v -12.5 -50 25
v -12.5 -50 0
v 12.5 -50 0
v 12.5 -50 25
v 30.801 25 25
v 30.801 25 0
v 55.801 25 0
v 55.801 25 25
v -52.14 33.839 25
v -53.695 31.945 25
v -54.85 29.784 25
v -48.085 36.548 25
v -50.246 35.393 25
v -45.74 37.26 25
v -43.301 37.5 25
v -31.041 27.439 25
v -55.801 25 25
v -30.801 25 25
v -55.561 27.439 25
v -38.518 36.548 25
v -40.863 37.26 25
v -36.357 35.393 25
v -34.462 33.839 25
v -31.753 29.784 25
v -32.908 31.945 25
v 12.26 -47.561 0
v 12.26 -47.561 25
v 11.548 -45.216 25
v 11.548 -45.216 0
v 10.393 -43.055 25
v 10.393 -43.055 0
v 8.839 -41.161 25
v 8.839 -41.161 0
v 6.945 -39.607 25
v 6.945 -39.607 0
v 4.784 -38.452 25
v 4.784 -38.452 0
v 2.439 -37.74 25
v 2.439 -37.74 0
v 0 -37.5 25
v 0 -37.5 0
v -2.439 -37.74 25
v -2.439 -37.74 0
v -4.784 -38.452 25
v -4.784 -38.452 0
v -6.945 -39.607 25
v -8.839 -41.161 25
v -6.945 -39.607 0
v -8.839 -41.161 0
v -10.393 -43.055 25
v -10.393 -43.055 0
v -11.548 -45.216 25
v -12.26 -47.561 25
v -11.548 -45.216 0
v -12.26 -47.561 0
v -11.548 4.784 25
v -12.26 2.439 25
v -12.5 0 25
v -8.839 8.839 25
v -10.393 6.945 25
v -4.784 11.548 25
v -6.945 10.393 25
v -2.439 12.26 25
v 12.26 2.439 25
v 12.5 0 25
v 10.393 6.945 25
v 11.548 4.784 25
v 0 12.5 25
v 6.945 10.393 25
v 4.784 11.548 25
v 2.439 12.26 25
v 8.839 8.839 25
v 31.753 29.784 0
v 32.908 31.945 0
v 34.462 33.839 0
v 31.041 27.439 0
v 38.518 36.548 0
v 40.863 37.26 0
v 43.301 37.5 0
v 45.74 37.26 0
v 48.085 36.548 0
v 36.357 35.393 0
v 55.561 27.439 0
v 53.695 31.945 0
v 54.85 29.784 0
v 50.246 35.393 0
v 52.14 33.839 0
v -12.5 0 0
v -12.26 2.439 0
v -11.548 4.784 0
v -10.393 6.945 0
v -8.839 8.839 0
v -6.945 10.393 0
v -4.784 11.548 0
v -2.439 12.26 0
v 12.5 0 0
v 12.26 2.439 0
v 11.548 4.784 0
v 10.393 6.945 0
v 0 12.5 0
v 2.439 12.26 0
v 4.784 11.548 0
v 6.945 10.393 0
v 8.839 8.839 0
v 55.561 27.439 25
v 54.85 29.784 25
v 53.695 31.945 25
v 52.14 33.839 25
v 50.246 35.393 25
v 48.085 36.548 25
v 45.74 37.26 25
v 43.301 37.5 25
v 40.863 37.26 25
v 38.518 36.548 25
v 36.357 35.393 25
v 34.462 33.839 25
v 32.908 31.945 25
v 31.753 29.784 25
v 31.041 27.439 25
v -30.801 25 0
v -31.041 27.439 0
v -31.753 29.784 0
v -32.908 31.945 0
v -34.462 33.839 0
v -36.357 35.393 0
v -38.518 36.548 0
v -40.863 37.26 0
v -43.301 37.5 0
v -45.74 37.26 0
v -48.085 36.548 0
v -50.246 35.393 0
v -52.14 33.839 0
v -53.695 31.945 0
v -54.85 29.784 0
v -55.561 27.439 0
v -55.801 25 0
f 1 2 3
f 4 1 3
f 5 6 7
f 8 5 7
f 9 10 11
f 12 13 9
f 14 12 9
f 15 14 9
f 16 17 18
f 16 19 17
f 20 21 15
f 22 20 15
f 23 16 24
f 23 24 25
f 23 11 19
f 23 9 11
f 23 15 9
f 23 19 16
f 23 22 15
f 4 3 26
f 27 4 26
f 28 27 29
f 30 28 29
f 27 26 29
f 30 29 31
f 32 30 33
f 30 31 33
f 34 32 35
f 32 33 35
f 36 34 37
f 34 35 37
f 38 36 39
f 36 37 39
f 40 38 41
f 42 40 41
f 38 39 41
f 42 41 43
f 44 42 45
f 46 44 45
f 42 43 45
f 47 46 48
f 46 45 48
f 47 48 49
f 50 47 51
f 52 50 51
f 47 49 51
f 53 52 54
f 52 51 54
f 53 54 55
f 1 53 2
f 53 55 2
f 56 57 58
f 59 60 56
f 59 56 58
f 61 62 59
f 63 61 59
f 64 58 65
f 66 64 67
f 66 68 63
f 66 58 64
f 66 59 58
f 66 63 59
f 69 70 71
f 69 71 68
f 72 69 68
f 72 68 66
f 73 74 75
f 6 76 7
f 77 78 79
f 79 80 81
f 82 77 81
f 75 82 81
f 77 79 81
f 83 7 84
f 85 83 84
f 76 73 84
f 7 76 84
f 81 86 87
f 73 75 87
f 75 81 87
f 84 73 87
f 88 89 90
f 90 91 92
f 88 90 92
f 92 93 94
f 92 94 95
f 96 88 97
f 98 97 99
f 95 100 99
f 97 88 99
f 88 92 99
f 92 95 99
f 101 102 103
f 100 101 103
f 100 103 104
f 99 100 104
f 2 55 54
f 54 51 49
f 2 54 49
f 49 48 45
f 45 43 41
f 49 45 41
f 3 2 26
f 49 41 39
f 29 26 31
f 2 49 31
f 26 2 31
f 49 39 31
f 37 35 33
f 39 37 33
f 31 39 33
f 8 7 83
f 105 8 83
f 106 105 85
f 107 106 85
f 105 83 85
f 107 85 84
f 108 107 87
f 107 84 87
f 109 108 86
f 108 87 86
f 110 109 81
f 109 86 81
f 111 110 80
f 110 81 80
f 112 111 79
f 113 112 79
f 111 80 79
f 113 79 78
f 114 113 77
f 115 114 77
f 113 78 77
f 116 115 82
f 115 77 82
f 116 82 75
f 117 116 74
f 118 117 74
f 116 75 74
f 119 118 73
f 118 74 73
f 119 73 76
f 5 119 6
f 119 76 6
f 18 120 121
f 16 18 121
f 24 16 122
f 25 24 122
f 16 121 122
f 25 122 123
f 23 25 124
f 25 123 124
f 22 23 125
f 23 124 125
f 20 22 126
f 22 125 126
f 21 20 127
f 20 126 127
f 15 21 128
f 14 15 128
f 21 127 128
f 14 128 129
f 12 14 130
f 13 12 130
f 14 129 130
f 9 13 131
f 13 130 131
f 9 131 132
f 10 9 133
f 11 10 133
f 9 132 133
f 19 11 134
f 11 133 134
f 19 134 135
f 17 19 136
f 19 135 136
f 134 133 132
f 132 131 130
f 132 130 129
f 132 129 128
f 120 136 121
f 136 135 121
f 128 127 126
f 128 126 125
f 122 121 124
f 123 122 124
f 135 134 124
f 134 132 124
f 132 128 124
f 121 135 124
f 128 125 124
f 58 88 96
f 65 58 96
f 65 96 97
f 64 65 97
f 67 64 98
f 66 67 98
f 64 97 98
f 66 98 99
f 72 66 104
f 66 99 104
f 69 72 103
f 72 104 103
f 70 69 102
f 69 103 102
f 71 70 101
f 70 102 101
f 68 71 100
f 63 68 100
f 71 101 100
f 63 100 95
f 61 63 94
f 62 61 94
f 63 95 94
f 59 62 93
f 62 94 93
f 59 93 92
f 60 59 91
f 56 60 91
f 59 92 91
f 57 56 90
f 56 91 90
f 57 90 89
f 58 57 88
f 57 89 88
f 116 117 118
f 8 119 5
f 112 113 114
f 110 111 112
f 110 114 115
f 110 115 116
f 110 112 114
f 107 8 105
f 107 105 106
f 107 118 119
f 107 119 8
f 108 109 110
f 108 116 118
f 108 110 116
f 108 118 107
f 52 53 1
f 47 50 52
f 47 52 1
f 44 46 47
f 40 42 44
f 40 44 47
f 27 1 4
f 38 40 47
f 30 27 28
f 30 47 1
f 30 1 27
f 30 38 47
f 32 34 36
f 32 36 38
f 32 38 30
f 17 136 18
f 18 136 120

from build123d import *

# Parameters (mm, degrees)
F1_DEPTH = 25


with BuildPart() as f1:
    # F0 (on Top) → F1 (new body)
    with BuildSketch(Plane.XY):
        with BuildLine():
            Line((-55.80127, 25), (-30.80127, 25))
            ThreePointArc((-30.80127, 25), (-43.30127, 37.5), (-55.80127, 25))
        make_face()
        with BuildLine():
            Line((-12.5, 0), (12.5, 0))
            ThreePointArc((12.5, 0), (0, 12.5), (-12.5, 0))
        make_face()
        with BuildLine():
            Line((30.80127, 25), (55.80127, 25))
            ThreePointArc((55.80127, 25), (43.30127, 37.5), (30.80127, 25))
        make_face()
        with BuildLine():
            Line((-12.5, -50), (12.5, -50))
            ThreePointArc((12.5, -50), (0, -37.5), (-12.5, -50))
        make_face()
    extrude(amount=F1_DEPTH)


solid = f1.part
